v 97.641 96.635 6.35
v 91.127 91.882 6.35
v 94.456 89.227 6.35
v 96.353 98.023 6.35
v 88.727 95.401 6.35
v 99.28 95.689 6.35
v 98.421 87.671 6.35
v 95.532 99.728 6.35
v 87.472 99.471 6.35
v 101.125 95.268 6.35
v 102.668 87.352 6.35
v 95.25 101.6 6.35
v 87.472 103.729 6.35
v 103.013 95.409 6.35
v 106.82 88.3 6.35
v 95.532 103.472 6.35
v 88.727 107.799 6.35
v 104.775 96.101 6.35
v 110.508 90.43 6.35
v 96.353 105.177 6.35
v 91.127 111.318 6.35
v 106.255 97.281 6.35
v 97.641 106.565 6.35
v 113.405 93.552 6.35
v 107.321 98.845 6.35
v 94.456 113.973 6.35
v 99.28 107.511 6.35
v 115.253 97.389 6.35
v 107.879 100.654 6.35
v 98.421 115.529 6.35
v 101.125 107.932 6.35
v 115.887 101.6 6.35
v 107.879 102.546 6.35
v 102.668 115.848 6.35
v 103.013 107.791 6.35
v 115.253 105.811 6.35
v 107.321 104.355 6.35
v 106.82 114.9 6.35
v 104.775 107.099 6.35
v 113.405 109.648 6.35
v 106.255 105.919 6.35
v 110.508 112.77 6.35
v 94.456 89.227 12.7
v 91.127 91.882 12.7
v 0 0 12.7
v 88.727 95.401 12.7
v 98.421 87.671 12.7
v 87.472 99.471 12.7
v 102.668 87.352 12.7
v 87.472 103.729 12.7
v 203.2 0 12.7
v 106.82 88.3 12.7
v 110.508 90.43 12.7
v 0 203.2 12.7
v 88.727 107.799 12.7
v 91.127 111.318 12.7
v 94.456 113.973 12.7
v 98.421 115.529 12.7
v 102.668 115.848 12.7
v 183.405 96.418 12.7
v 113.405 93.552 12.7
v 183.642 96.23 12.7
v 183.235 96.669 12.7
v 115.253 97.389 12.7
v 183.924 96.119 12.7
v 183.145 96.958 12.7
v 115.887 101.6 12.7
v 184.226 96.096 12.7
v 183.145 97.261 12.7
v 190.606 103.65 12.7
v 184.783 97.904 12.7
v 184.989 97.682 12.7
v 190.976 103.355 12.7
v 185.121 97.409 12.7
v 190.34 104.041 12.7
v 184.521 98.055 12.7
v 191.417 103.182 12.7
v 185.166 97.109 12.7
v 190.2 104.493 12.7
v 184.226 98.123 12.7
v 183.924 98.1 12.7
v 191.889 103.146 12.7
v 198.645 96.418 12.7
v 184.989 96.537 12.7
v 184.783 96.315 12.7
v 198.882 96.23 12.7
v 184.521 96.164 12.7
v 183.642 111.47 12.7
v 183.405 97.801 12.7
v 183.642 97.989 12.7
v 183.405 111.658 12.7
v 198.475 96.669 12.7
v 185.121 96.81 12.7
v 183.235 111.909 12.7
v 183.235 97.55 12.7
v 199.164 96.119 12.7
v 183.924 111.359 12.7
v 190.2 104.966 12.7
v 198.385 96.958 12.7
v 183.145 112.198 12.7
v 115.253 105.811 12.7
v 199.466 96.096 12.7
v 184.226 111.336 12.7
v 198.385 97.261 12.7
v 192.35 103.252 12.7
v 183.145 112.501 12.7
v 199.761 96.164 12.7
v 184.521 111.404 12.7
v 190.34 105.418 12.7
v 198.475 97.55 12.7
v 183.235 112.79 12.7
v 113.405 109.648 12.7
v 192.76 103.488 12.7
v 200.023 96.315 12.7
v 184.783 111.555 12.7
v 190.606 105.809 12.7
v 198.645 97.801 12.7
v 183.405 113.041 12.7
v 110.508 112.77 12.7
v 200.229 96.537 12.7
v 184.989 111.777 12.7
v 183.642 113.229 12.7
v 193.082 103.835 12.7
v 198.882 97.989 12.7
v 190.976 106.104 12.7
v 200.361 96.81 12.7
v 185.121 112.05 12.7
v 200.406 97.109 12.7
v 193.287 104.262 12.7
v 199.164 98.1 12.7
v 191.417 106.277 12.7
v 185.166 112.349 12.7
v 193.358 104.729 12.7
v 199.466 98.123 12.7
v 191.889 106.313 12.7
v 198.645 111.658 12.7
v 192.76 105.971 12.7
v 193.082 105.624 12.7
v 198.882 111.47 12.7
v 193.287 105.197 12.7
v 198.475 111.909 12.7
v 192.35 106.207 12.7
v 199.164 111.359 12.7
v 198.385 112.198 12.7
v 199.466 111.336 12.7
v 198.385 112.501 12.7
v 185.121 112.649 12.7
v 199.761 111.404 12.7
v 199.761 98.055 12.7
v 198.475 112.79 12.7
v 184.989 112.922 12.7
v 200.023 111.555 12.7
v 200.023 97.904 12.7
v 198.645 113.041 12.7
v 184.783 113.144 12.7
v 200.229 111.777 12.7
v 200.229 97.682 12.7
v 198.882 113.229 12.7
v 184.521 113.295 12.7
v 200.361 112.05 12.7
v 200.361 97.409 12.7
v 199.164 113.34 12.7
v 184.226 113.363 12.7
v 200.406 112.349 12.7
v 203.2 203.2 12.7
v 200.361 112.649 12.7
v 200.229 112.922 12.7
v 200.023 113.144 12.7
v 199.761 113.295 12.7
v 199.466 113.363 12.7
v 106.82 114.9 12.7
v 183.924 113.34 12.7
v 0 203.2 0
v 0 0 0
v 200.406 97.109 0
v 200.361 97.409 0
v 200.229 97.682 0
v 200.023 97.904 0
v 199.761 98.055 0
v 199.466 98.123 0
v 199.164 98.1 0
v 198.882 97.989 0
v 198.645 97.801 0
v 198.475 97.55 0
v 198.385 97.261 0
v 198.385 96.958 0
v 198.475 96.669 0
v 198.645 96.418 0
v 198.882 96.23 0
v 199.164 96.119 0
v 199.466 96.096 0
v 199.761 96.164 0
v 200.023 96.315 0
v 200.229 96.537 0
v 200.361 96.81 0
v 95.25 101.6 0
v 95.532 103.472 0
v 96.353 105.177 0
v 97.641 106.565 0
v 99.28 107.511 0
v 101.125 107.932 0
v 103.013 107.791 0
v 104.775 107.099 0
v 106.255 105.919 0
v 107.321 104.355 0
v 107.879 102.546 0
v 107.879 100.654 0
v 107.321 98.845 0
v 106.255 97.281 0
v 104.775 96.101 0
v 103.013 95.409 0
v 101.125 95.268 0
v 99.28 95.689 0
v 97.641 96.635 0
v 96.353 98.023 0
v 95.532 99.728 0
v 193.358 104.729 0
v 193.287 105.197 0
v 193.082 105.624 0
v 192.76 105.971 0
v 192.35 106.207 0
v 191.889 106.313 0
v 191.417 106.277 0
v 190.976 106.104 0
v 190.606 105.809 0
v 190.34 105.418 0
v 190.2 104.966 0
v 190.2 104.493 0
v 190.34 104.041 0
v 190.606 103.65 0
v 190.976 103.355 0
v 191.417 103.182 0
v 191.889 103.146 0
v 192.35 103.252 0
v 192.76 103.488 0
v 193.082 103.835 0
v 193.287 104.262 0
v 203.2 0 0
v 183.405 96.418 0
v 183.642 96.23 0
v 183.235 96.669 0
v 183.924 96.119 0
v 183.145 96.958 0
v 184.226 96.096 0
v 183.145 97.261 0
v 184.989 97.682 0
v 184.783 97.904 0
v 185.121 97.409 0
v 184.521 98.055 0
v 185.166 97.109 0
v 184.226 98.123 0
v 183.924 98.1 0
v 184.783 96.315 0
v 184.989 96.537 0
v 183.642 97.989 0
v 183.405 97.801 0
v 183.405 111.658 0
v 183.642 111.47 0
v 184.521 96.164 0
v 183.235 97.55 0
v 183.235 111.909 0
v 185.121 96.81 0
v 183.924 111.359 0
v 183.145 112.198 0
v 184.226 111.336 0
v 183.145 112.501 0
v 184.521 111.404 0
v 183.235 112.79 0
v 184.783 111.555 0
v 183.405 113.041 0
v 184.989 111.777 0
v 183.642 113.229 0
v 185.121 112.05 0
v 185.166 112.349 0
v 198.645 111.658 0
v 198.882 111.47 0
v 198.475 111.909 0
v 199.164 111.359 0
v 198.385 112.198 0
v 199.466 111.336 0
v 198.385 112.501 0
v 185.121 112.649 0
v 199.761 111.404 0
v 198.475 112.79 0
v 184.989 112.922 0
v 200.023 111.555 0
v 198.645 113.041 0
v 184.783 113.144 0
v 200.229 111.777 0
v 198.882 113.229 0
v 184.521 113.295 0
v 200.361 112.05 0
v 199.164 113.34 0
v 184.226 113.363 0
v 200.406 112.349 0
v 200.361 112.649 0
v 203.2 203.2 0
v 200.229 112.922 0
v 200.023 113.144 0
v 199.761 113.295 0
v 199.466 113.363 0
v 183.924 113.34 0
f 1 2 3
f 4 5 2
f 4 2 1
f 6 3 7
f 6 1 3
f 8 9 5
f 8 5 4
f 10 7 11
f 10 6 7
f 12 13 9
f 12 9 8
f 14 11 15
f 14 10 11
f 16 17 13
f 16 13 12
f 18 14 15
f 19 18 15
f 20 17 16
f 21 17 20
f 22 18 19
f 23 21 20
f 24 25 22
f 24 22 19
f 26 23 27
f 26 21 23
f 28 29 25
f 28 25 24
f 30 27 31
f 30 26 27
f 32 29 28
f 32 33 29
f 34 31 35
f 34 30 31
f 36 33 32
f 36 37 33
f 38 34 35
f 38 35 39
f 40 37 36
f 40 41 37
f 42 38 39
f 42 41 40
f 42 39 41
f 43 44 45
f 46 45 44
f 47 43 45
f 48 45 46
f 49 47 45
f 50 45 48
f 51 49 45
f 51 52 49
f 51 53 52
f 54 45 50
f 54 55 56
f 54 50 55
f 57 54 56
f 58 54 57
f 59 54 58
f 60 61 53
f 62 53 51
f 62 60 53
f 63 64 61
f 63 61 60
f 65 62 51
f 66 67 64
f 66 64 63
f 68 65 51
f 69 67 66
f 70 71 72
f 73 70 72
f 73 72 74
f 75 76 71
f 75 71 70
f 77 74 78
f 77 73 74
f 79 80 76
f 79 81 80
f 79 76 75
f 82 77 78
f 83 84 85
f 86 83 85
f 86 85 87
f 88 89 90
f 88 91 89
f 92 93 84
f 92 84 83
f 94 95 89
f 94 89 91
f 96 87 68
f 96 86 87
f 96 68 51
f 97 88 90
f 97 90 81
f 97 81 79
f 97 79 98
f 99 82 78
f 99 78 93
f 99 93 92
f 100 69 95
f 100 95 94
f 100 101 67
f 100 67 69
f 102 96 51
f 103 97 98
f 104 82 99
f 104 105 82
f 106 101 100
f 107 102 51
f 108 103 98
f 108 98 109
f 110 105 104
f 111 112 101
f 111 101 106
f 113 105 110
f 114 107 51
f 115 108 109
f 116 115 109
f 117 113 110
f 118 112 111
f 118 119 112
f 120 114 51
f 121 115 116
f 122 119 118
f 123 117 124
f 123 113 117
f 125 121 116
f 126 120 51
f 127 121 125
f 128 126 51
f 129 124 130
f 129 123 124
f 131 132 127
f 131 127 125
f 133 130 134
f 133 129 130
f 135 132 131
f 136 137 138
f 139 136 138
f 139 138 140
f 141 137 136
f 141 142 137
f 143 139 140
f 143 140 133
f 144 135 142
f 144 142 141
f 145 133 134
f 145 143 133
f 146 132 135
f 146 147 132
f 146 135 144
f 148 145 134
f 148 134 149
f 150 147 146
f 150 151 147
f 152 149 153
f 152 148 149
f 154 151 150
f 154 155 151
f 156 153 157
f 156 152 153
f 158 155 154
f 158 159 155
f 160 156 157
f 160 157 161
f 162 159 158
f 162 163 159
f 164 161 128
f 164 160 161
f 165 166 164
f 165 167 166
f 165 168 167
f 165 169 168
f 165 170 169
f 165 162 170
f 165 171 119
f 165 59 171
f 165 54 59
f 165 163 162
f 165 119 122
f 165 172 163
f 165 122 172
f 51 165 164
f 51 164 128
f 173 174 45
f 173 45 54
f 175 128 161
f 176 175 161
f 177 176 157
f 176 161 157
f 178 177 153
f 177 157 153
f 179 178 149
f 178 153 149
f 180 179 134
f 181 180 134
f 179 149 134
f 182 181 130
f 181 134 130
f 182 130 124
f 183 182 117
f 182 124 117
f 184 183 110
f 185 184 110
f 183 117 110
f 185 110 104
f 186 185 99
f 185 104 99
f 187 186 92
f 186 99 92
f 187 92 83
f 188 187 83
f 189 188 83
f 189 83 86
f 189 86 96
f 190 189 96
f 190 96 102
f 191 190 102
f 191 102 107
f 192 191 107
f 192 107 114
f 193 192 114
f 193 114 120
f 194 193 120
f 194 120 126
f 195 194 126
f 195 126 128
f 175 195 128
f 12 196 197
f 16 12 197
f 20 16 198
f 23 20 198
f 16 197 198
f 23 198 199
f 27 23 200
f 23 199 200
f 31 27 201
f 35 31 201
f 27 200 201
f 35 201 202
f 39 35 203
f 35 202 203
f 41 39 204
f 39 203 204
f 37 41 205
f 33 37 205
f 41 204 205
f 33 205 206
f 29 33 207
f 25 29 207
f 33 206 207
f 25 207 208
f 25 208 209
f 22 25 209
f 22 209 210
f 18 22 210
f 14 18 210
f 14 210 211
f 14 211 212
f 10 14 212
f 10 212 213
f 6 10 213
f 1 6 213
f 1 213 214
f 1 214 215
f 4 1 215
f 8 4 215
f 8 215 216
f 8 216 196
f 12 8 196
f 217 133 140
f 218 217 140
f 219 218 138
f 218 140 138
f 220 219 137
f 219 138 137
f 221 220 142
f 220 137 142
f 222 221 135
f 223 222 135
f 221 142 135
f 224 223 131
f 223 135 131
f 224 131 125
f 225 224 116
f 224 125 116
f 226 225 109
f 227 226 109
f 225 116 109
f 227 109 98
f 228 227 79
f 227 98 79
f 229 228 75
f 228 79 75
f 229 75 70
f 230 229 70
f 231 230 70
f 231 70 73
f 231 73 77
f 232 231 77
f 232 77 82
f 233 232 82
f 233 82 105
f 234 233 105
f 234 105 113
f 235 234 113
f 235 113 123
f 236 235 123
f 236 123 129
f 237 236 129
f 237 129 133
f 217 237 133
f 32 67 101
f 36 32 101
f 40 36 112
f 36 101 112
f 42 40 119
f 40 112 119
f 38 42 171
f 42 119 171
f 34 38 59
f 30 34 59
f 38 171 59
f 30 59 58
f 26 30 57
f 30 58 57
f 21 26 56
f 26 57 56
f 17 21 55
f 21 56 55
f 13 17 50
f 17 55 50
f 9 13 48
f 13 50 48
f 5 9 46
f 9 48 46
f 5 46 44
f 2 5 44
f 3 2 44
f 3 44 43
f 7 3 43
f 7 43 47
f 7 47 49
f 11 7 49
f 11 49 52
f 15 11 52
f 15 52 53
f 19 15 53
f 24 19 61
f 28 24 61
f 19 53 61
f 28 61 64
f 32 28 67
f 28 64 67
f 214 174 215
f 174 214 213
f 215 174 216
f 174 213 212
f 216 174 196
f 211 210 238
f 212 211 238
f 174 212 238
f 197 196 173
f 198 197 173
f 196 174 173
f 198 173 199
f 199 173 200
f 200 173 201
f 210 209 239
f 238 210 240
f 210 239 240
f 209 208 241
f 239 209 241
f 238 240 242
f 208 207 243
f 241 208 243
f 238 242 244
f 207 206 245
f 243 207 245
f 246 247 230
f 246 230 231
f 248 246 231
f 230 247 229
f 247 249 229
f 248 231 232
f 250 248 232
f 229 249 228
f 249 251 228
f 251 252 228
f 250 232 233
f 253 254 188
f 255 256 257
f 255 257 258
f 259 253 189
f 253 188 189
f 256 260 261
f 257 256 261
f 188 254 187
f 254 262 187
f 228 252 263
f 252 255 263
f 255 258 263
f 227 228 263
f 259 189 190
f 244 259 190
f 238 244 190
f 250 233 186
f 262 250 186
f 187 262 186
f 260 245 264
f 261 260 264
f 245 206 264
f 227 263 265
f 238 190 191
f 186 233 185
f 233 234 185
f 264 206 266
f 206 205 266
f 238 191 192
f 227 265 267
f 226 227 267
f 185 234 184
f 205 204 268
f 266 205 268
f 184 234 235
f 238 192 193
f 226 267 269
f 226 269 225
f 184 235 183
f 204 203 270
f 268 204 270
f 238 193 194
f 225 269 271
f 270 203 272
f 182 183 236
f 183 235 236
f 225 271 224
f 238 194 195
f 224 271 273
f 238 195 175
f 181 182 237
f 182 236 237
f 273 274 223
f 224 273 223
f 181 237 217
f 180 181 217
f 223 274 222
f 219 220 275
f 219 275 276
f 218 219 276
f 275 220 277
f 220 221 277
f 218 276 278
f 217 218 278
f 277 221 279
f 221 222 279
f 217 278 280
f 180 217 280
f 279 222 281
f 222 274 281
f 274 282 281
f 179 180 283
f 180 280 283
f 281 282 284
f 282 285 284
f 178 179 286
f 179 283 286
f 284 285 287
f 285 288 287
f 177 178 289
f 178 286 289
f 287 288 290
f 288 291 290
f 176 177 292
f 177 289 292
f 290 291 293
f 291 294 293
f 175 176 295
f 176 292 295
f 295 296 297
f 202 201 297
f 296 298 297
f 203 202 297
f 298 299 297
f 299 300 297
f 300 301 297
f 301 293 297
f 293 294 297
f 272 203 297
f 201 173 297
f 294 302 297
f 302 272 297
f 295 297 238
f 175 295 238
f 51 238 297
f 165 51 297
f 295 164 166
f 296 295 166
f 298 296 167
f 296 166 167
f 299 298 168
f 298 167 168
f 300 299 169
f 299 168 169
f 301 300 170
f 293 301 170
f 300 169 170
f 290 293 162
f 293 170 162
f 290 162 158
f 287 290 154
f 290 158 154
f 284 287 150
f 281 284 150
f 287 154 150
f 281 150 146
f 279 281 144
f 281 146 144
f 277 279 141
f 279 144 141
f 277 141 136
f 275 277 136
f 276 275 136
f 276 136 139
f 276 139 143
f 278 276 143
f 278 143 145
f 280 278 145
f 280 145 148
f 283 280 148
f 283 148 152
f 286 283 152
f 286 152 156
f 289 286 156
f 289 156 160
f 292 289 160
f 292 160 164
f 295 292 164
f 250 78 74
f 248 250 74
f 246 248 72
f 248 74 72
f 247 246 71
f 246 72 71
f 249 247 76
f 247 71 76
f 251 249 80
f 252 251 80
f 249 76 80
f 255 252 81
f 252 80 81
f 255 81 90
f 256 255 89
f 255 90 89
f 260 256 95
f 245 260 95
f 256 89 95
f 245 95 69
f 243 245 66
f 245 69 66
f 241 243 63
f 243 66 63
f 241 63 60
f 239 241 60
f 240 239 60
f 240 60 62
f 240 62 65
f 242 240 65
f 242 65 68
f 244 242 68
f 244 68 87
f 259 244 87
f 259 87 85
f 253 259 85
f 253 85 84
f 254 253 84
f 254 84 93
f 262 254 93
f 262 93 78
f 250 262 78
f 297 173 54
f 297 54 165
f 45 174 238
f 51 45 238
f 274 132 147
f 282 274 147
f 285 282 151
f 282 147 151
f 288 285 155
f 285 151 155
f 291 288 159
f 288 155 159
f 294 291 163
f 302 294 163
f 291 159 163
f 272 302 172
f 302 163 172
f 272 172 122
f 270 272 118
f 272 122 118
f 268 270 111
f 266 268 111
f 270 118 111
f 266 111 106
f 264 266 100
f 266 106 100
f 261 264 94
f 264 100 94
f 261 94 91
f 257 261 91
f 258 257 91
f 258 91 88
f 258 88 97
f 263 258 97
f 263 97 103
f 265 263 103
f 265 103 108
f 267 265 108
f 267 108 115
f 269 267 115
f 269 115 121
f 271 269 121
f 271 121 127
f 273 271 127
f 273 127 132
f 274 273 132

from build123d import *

# Parameters (mm, degrees)
SKETCH1_W                  = 203.2
SKETCH1_H                  = 203.2
BOSS_EXTRUDE1_DEPTH        = 12.7
F_1_2_0_5_DIAMETER_HOLE1_D = 12.7
SKETCH7_R                  = 14.2875
CUT_EXTRUDE1_DEPTH         = 6.35
SKETCH8_R                  = 1.5875
SKETCH8_R_2                = 1.016
CUT_EXTRUDE2_DEPTH         = 288.648691984


with BuildPart() as part:
    # Sketch1 → Boss-Extrude1 (new body)
    with BuildSketch(Plane.XY):
        with Locations((101.6, 101.6)):
            Rectangle(SKETCH1_W, SKETCH1_H)
    extrude(amount=BOSS_EXTRUDE1_DEPTH)

    # 1/2 (0.5) Diameter Hole1 (through all)
    with Locations(Plane.XY.offset(12.7)):
        with Locations((101.6, 101.6)):
            Hole(F_1_2_0_5_DIAMETER_HOLE1_D / 2)

    # Sketch7 → Cut-Extrude1 (cut)
    with BuildSketch(Plane.XY.offset(12.7)):
        with Locations((101.6, 101.6)):
            Circle(SKETCH7_R)
    extrude(amount=-CUT_EXTRUDE1_DEPTH, mode=Mode.SUBTRACT)

    # Sketch8 → Cut-Extrude2 (cut, through all)
    with BuildSketch(Plane.XY.offset(12.7)):
        with Locations((191.77, 104.729470927)):
            Circle(SKETCH8_R)
        with Locations((184.15, 112.349470927)):
            Circle(SKETCH8_R_2)
        with Locations((199.39, 112.349470927)):
            Circle(SKETCH8_R_2)
        with Locations((199.39, 97.109470927)):
            Circle(SKETCH8_R_2)
        with Locations((184.15, 97.109470927)):
            Circle(SKETCH8_R_2)
    extrude(amount=-CUT_EXTRUDE2_DEPTH, mode=Mode.SUBTRACT)


solid = part.part
